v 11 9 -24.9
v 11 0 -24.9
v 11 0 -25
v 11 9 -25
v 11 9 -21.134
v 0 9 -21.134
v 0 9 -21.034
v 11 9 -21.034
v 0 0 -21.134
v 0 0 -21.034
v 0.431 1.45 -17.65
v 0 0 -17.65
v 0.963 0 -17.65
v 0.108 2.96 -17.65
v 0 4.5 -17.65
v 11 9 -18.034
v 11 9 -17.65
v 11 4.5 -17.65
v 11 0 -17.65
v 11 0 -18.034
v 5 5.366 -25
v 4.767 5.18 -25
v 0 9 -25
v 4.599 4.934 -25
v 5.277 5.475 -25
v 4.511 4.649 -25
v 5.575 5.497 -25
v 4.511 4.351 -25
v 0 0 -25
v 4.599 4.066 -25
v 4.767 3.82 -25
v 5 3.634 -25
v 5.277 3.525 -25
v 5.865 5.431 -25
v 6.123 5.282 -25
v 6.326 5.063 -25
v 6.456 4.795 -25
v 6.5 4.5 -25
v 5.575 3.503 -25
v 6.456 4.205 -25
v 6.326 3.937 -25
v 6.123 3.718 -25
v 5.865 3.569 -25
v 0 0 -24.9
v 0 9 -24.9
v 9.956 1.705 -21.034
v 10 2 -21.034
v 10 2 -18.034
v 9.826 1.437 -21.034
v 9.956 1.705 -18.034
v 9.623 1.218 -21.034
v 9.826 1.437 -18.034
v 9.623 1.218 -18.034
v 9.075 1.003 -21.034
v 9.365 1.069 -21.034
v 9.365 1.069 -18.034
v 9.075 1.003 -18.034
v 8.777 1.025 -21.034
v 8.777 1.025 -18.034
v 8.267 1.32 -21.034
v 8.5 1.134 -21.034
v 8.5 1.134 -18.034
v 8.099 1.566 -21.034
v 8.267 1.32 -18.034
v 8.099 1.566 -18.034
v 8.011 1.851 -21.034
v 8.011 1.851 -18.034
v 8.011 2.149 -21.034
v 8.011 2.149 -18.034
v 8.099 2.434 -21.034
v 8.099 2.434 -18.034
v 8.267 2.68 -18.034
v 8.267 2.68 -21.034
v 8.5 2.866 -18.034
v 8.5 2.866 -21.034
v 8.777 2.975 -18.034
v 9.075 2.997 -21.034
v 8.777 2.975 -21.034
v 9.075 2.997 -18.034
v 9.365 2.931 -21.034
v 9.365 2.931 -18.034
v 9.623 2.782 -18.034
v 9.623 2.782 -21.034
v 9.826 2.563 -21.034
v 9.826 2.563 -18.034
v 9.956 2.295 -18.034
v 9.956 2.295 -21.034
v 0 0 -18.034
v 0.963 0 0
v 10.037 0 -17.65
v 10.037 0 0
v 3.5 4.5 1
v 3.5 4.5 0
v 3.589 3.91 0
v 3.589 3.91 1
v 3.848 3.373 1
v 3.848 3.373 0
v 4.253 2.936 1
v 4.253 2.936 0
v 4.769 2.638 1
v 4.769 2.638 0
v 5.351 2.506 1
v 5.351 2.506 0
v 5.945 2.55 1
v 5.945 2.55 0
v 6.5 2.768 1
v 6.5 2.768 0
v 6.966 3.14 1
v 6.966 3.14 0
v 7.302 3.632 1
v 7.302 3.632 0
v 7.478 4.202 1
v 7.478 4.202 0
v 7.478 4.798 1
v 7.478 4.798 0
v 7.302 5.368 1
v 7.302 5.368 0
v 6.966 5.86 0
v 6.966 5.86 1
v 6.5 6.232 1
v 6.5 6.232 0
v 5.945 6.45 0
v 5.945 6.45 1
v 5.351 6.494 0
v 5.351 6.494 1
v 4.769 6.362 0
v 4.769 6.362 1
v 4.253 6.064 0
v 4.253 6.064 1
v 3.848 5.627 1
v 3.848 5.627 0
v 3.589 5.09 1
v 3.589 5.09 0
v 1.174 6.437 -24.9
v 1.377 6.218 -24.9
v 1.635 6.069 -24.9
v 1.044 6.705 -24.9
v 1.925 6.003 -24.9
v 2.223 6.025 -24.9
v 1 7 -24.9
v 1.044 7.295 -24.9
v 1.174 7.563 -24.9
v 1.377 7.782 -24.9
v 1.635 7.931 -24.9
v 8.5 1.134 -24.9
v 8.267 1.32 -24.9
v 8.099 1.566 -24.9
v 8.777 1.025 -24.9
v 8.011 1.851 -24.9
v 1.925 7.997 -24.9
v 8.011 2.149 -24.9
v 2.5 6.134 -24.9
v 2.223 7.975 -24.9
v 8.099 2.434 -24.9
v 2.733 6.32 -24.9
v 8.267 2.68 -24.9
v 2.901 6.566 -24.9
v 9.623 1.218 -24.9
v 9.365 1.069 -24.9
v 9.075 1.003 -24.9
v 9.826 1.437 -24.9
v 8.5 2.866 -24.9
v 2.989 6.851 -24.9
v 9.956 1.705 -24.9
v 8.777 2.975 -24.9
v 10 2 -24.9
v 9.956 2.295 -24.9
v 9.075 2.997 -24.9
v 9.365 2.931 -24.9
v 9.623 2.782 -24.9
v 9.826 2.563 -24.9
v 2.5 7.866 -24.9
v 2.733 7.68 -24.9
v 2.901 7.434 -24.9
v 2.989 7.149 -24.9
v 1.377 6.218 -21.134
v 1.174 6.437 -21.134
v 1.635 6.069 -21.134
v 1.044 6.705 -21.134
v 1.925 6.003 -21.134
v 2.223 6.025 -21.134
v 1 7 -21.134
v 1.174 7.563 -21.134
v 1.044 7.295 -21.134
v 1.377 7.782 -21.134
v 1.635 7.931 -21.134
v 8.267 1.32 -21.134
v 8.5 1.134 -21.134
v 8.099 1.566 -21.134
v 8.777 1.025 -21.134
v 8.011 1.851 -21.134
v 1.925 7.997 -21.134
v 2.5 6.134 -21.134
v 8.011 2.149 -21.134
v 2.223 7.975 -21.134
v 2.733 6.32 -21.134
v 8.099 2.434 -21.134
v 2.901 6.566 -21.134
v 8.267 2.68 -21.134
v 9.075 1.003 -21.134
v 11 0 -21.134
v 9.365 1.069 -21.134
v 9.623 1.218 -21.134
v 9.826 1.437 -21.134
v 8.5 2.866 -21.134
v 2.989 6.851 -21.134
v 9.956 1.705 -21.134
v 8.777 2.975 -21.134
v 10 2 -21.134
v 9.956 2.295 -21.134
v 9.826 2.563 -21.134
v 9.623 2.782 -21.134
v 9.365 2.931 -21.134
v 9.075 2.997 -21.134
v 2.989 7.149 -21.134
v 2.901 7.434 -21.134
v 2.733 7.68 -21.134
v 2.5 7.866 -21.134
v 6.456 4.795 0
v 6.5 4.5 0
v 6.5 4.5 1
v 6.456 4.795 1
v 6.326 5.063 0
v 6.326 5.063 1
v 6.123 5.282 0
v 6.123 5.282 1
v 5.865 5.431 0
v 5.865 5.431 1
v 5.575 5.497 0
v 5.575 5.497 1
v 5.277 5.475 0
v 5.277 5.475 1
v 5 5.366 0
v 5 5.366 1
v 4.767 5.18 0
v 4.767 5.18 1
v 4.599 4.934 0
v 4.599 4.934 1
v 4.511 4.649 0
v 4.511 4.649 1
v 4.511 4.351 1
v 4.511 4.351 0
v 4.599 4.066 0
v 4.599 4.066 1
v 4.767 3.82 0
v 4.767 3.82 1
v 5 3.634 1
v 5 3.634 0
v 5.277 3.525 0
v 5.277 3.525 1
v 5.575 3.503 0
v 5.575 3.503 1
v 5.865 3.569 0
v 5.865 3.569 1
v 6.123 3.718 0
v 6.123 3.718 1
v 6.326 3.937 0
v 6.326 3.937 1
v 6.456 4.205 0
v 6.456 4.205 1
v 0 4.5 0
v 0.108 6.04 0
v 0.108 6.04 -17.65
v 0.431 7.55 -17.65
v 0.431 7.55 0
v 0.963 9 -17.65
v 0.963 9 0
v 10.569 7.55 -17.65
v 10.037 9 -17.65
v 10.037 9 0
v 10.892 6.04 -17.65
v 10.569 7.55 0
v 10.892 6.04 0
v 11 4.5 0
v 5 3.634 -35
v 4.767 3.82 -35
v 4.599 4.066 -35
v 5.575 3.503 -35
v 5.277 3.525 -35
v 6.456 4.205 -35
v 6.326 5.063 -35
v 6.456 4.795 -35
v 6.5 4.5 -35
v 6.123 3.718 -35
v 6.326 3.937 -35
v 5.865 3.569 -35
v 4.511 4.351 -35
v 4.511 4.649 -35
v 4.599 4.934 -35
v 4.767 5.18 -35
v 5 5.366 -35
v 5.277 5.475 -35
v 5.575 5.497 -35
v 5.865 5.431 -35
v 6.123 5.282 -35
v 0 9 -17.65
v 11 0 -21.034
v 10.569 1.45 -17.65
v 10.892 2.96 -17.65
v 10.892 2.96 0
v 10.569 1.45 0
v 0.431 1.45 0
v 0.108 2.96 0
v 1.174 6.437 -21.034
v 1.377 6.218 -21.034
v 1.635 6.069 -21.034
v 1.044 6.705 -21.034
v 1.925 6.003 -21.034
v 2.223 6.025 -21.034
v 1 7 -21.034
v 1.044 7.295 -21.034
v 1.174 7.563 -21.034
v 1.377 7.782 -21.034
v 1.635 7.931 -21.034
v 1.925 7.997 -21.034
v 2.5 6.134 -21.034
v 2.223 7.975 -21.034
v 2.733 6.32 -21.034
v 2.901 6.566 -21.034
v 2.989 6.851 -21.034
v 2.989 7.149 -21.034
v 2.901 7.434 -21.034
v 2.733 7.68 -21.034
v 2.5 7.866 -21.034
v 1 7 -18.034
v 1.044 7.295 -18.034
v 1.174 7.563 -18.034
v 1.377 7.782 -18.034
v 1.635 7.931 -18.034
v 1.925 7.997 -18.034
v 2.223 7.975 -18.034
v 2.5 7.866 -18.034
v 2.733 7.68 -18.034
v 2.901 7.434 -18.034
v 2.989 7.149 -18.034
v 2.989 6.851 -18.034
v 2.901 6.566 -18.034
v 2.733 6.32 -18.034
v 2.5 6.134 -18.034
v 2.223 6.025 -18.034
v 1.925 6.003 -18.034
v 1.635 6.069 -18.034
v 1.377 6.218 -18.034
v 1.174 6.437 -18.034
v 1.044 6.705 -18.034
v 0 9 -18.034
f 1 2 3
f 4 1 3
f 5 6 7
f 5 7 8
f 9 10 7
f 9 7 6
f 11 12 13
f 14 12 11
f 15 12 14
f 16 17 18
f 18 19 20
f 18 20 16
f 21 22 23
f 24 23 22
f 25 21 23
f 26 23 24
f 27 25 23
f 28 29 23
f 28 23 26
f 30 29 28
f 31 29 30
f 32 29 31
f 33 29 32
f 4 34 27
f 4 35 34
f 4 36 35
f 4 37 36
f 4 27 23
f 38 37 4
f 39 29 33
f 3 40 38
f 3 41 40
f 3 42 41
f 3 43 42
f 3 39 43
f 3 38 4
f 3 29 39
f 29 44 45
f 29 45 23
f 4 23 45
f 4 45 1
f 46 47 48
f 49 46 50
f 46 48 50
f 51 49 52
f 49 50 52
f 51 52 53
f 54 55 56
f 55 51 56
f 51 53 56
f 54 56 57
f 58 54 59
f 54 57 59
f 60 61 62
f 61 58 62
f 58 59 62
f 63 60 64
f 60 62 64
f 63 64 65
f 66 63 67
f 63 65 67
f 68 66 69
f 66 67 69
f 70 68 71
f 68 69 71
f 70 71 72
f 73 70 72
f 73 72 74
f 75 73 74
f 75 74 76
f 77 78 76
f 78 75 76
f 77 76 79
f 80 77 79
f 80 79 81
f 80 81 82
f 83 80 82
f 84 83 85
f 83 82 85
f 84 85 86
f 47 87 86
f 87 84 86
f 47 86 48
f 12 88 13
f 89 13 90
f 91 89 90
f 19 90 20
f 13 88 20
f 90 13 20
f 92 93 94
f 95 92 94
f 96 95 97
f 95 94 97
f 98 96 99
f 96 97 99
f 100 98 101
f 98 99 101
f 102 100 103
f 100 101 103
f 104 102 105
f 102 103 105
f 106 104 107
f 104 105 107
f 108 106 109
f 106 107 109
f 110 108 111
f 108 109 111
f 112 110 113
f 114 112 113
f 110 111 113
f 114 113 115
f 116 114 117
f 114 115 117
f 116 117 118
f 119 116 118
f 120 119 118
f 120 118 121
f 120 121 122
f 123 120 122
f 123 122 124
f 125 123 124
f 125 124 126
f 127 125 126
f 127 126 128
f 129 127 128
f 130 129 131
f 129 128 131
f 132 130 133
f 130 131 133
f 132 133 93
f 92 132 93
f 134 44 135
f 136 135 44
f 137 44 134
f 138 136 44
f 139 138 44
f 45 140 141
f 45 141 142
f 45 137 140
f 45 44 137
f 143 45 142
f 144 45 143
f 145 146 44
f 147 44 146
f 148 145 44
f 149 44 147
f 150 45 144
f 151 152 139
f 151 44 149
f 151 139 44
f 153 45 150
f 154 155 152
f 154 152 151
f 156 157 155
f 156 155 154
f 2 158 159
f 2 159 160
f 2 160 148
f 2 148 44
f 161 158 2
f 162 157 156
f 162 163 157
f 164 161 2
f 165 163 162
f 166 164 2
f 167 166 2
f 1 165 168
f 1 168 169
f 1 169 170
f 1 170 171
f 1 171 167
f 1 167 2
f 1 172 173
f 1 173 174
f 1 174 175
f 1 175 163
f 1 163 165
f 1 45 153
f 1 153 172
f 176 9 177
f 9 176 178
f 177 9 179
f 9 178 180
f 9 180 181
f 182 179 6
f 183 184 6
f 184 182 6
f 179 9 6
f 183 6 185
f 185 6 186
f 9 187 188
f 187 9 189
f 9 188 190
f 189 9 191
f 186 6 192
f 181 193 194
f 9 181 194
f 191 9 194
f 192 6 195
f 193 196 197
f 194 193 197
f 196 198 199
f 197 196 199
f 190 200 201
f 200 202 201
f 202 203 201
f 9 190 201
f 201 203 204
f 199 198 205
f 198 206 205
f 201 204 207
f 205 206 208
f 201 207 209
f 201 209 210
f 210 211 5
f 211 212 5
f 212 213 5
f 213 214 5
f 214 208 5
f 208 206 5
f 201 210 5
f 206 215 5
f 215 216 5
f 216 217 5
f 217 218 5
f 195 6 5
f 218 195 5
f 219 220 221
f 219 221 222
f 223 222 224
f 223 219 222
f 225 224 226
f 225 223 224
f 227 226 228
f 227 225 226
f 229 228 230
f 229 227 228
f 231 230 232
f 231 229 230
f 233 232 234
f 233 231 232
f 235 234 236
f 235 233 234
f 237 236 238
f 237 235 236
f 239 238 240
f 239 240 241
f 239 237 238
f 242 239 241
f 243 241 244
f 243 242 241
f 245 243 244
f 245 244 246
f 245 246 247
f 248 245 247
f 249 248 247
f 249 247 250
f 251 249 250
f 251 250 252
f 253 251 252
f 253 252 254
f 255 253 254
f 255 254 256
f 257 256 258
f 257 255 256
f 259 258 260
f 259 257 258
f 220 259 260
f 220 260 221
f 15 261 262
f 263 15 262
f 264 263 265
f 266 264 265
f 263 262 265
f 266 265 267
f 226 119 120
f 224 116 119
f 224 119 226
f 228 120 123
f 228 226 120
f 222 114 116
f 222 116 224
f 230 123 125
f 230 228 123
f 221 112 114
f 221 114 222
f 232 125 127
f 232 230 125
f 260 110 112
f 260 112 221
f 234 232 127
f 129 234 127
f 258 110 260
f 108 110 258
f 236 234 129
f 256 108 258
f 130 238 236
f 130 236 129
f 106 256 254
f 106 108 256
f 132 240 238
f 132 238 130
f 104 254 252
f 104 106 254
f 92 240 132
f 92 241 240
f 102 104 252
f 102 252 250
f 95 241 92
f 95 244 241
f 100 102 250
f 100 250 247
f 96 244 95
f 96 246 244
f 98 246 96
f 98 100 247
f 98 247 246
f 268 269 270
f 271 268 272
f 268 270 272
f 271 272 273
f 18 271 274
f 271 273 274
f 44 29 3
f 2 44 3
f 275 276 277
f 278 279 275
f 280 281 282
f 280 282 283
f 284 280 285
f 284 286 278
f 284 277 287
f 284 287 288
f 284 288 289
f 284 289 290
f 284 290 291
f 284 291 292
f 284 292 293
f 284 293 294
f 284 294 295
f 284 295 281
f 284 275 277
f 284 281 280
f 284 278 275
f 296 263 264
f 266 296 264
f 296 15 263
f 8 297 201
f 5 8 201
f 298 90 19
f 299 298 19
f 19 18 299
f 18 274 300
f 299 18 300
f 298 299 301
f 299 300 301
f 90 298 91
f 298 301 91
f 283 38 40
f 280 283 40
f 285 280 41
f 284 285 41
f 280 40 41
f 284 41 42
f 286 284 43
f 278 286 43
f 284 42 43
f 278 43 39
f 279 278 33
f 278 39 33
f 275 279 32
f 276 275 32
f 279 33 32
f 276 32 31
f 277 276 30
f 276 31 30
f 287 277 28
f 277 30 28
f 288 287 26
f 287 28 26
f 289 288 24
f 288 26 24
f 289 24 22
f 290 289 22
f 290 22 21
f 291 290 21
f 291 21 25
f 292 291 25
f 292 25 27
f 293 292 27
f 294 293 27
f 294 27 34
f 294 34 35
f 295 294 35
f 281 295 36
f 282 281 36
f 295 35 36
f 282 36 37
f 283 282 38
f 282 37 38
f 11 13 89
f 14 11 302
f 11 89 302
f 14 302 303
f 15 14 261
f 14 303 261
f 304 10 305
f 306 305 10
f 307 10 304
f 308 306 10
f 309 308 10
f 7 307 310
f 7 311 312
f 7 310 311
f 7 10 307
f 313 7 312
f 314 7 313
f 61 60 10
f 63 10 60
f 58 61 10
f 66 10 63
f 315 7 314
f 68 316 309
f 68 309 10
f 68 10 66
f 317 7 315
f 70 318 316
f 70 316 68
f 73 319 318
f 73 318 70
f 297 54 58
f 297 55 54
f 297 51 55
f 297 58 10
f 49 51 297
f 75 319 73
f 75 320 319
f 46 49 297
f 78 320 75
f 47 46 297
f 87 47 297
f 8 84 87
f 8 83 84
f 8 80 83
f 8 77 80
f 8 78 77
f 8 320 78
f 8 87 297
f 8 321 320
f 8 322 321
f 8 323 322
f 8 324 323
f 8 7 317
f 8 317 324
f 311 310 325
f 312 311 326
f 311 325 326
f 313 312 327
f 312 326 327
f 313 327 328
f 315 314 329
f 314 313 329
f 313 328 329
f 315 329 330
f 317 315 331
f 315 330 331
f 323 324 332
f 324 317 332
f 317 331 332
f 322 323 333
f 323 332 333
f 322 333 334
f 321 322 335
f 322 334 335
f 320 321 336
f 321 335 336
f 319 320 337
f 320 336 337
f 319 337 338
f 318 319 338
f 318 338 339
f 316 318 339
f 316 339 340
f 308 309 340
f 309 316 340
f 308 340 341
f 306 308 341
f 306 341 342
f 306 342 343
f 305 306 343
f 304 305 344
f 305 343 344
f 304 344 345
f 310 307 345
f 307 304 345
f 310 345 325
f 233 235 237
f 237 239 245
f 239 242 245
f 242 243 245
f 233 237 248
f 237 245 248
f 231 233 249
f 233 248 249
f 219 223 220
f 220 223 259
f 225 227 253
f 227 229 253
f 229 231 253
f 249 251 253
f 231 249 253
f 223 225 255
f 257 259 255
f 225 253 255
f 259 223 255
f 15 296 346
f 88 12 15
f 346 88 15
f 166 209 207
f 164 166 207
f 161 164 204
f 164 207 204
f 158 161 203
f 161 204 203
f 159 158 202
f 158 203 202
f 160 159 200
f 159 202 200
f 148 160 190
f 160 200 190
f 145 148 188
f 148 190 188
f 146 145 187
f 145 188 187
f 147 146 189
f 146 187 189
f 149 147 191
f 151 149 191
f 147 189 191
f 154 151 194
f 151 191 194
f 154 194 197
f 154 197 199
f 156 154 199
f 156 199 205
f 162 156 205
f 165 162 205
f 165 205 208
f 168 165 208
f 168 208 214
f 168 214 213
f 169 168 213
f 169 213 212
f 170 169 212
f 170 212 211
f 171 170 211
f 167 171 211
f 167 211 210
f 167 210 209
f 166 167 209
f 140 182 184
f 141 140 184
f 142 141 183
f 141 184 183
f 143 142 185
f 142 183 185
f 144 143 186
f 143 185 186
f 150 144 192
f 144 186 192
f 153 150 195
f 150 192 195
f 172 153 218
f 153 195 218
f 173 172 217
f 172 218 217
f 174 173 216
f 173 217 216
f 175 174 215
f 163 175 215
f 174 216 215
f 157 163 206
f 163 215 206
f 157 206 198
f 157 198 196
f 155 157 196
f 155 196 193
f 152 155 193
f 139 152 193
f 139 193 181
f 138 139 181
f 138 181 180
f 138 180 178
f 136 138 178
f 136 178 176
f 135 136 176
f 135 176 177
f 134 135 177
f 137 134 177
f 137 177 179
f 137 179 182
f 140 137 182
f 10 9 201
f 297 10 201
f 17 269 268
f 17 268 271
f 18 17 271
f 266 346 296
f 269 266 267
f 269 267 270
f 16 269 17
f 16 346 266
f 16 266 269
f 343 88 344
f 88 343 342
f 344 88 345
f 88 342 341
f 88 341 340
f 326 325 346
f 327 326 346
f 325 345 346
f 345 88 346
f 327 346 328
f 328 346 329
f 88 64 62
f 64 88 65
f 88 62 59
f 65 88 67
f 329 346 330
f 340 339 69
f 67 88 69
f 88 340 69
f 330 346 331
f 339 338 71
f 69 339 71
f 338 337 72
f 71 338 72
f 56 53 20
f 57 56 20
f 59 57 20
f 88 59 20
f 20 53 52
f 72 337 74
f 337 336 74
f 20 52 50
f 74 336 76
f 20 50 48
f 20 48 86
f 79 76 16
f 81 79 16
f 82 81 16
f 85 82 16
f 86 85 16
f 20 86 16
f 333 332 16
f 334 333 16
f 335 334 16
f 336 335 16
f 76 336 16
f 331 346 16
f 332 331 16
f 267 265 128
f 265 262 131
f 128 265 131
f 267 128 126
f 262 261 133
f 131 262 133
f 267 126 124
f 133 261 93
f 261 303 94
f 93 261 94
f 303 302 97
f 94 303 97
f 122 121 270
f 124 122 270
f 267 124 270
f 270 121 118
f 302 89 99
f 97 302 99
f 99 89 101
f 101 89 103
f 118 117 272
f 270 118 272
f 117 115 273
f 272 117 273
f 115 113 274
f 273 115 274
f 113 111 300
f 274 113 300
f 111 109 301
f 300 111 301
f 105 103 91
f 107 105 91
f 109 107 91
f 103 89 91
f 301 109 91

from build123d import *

# Parameters (mm, degrees)
SKETCH1_W           = 11
SKETCH1_H           = 25
BOSS_EXTRUDE1_DEPTH = 9
SKETCH2_W           = 11
SKETCH2_H           = 3
SKETCH2_H_2         = 3.765669969
CUT_EXTRUDE2_DEPTH  = 29.757607689
CUT_EXTRUDE3_DEPTH  = 17.65
BOSS_EXTRUDE2_START = -6.96567
SKETCH4_R           = 1
BOSS_EXTRUDE2_DEPTH = 6.86567
SKETCH5_R           = 2
SKETCH5_R_2         = 1
BOSS_EXTRUDE3_DEPTH = 1
SKETCH6_R           = 1
BOSS_EXTRUDE4_DEPTH = 10


with BuildPart() as part:
    # Sketch1 → Boss-Extrude1 (new body)
    with BuildSketch(Plane(origin=(0, 0, 0), x_dir=(1, 0, 0), z_dir=(0, 1, 0))):
        with Locations((5.5, 12.5)):
            Rectangle(SKETCH1_W, SKETCH1_H)
    extrude(amount=BOSS_EXTRUDE1_DEPTH)

    # Sketch2 → Cut-Extrude2 (cut, through all)
    with BuildSketch(Plane(origin=(0, 9, 0), x_dir=(1, 0, 0), z_dir=(0, 1, 0))):
        with Locations((5.5, 19.534330031)):
            Rectangle(SKETCH2_W, SKETCH2_H)
        with Locations((5.5, 23.017165016)):
            Rectangle(SKETCH2_W, SKETCH2_H_2)
    extrude(amount=-CUT_EXTRUDE2_DEPTH, mode=Mode.SUBTRACT)


with BuildPart() as cut_extrude2_piece_1:
    # of the separate pieces the step leaves, piece 1, a body of its own (cut_extrude2_pieces)
    add(part.part.solids().sort_by_distance((0, 0, 0))[0])

    # Sketch3 → Cut-Extrude3 (cut)
    with BuildSketch(Plane.XY):
        with BuildLine():
            Line((11, 9), (10.03742995, 9))
            ThreePointArc((10.03742995, 9), (10.756666057, 6.800898811), (11, 4.500000028))
            Line((11, 4.500000028), (11, 9))
        make_face()
        with BuildLine():
            Line((11, 0), (11, 4.500000028))
            ThreePointArc((11, 4.500000028), (10.756666063, 2.199101216), (10.03742995, 0))
            Line((10.03742995, 0), (11, 0))
        make_face()
        with BuildLine():
            ThreePointArc((0.96257005, 0), (0.243333935, 2.199101225), (0, 4.500000045))
            Line((0, 4.500000045), (0, 0))
            Line((0, 0), (0.96257005, 0))
        make_face()
        with BuildLine():
            ThreePointArc((0, 4.500000045), (0.243333945, 6.800898819), (0.96257005, 9))
            Line((0.96257005, 9), (0, 9))
            Line((0, 9), (0, 4.500000045))
        make_face()
    extrude(amount=-CUT_EXTRUDE3_DEPTH, mode=Mode.SUBTRACT)



with BuildPart() as cut_extrude2_piece_2:
    # of the separate pieces the step leaves, piece 2, a body of its own (cut_extrude2_pieces)
    add(part.part.solids().sort_by_distance((0, 0, -21.134330031))[0])


with BuildPart() as cut_extrude2_piece_3:
    # of the separate pieces the step leaves, piece 3, a body of its own (cut_extrude2_pieces)
    add(part.part.solids().sort_by_distance((0, 0, -25))[0])


with BuildPart() as cut_extrude2_piece_1_1:
    add(cut_extrude2_piece_1.part)

    add(cut_extrude2_piece_2.part)  # Boss-Extrude2 merges Cut-Extrude2 piece 2

    add(cut_extrude2_piece_3.part)  # Boss-Extrude2 merges Cut-Extrude2 piece 3
    # Sketch4 → Boss-Extrude2 (add)
    with BuildSketch(Plane(origin=(0, 0, -25), x_dir=(-1, 0, 0), z_dir=(0, 0, -1)).offset(BOSS_EXTRUDE2_START)):
        with Locations((-2, 7)):
            Circle(SKETCH4_R)
        with Locations(Location((-9, 2, 0), (0, 0, 180))):
            Circle(SKETCH4_R)
    extrude(amount=BOSS_EXTRUDE2_DEPTH)

    # Sketch5 → Boss-Extrude3 (add)
    with BuildSketch(Plane.XY):
        with Locations(Location((5.5, 4.5, 0), (0, 0, 180))):
            Circle(SKETCH5_R)
        with Locations((5.5, 4.5)):
            Circle(SKETCH5_R_2, mode=Mode.SUBTRACT)
    extrude(amount=BOSS_EXTRUDE3_DEPTH)

    # Sketch6 → Boss-Extrude4 (add)
    with BuildSketch(Plane(origin=(0, 0, -25), x_dir=(-1, 0, 0), z_dir=(0, 0, -1))):
        with Locations(Location((-5.5, 4.5, 0), (0, 0, 180))):
            Circle(SKETCH6_R)
    extrude(amount=BOSS_EXTRUDE4_DEPTH)


solid = cut_extrude2_piece_1_1.part
